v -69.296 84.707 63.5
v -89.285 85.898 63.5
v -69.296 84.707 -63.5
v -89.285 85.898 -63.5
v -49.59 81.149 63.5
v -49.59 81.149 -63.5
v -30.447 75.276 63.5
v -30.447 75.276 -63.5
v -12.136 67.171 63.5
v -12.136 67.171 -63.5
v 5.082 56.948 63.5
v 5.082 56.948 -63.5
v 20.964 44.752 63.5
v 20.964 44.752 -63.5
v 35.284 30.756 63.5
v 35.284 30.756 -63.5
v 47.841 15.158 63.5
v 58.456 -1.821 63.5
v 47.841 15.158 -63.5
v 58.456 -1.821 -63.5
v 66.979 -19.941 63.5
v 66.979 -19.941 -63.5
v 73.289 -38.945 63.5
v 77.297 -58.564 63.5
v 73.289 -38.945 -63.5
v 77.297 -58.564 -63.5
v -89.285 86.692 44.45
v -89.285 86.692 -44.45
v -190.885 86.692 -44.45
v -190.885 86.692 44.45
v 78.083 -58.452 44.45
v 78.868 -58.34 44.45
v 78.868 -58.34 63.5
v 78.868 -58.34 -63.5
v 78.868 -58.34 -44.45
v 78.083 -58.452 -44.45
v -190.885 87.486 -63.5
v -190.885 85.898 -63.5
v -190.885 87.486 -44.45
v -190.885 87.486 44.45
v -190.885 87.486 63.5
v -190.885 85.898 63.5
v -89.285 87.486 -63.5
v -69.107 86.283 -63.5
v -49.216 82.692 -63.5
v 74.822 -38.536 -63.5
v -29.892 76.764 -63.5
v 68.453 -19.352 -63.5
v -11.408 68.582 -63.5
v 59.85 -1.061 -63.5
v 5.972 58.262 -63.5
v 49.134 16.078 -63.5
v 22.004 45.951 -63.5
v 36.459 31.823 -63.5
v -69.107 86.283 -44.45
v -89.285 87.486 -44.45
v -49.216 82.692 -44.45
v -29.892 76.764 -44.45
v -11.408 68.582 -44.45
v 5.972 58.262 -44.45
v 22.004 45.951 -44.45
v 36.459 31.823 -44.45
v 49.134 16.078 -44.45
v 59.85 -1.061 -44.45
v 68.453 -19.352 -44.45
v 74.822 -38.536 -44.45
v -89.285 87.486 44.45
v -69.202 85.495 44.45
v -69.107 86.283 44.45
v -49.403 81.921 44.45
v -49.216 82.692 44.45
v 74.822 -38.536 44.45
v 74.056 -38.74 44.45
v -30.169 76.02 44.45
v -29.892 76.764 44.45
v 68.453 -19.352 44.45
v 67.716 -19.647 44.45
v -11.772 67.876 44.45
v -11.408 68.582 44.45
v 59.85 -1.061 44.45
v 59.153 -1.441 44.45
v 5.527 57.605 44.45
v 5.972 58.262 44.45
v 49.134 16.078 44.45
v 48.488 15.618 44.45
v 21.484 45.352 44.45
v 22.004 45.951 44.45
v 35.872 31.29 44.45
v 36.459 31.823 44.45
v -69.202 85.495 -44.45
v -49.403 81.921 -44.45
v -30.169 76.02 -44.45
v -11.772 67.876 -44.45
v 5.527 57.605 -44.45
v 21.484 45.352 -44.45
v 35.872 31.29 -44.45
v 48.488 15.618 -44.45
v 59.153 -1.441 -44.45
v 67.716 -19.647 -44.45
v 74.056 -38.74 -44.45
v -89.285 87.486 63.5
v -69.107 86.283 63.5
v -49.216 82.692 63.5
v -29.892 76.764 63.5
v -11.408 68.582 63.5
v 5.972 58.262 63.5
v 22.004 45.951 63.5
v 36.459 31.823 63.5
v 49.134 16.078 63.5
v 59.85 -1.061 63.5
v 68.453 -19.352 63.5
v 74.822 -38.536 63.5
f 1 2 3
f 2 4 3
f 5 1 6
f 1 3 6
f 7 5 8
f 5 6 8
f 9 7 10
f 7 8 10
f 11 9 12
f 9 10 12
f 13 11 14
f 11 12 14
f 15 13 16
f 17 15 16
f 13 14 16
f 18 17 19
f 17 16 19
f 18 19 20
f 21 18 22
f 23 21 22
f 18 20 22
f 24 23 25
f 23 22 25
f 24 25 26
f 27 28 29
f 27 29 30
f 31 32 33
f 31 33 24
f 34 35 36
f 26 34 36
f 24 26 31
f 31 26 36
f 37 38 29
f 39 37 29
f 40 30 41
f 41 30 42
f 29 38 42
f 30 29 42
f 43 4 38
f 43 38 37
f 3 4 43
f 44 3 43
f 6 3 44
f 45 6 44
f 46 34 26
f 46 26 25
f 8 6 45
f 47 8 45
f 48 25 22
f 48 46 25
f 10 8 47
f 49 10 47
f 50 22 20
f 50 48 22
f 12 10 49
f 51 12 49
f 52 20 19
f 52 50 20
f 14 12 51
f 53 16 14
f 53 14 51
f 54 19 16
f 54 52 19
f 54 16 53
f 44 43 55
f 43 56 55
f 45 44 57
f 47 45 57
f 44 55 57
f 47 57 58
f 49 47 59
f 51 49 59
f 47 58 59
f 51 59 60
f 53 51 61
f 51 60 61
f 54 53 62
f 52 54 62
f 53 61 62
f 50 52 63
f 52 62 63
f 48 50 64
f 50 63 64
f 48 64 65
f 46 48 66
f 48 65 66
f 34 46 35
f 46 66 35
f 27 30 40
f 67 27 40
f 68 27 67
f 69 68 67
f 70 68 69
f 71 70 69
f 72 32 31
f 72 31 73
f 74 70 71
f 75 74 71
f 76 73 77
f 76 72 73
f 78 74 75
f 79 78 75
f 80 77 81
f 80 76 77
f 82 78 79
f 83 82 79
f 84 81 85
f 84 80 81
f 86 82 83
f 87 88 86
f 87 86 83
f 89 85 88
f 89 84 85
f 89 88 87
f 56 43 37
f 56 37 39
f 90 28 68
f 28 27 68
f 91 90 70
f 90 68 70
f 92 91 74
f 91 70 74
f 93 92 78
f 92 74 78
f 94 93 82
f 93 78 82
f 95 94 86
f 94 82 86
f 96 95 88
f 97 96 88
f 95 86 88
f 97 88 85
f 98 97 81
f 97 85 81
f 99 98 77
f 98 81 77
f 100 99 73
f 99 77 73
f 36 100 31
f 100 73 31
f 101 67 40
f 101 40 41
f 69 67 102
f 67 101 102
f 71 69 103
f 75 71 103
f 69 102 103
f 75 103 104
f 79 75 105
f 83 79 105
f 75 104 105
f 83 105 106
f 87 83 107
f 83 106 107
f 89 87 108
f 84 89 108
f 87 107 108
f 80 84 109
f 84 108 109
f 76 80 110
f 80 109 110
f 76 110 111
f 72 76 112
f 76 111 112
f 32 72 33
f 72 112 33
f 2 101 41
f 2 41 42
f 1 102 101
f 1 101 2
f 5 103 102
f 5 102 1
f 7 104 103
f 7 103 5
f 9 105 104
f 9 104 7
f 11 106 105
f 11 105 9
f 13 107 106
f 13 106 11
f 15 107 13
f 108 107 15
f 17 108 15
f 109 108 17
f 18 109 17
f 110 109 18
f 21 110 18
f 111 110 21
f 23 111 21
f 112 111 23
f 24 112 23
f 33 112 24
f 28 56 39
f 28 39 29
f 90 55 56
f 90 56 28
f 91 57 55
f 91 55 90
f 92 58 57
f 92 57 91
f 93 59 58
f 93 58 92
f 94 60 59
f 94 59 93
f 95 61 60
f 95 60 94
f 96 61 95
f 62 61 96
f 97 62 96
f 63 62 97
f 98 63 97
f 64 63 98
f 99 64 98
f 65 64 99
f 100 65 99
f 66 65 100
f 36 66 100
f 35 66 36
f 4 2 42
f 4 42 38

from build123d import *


with BuildPart() as part:
    # Sweep2: sweep along a path in Sketch1
    with BuildLine(Plane.XY) as sweep2_path:
        Line((-190.884848485, 85.898181818), (-89.284848485, 85.898181818))
        ThreePointArc((-89.284848485, 85.898181818), (20.963569163, 44.75210076), (77.296784563, -58.564318182))
    # Sketch2 → Sweep2 (sweep)
    with BuildSketch(Plane(origin=(-190.884848485, 0, 0), x_dir=(0, 0, -1), z_dir=(1, 0, 0))):
        Polygon((-63.5, 85.898181818), (63.5, 85.898181818), (63.5, 87.485681818), (44.45, 87.485681818), (44.45, 86.691931818), (-44.45, 86.691931818), (-44.45, 87.485681818), (-63.5, 87.485681818), align=None)
    sweep(path=sweep2_path.line)


solid = part.part
